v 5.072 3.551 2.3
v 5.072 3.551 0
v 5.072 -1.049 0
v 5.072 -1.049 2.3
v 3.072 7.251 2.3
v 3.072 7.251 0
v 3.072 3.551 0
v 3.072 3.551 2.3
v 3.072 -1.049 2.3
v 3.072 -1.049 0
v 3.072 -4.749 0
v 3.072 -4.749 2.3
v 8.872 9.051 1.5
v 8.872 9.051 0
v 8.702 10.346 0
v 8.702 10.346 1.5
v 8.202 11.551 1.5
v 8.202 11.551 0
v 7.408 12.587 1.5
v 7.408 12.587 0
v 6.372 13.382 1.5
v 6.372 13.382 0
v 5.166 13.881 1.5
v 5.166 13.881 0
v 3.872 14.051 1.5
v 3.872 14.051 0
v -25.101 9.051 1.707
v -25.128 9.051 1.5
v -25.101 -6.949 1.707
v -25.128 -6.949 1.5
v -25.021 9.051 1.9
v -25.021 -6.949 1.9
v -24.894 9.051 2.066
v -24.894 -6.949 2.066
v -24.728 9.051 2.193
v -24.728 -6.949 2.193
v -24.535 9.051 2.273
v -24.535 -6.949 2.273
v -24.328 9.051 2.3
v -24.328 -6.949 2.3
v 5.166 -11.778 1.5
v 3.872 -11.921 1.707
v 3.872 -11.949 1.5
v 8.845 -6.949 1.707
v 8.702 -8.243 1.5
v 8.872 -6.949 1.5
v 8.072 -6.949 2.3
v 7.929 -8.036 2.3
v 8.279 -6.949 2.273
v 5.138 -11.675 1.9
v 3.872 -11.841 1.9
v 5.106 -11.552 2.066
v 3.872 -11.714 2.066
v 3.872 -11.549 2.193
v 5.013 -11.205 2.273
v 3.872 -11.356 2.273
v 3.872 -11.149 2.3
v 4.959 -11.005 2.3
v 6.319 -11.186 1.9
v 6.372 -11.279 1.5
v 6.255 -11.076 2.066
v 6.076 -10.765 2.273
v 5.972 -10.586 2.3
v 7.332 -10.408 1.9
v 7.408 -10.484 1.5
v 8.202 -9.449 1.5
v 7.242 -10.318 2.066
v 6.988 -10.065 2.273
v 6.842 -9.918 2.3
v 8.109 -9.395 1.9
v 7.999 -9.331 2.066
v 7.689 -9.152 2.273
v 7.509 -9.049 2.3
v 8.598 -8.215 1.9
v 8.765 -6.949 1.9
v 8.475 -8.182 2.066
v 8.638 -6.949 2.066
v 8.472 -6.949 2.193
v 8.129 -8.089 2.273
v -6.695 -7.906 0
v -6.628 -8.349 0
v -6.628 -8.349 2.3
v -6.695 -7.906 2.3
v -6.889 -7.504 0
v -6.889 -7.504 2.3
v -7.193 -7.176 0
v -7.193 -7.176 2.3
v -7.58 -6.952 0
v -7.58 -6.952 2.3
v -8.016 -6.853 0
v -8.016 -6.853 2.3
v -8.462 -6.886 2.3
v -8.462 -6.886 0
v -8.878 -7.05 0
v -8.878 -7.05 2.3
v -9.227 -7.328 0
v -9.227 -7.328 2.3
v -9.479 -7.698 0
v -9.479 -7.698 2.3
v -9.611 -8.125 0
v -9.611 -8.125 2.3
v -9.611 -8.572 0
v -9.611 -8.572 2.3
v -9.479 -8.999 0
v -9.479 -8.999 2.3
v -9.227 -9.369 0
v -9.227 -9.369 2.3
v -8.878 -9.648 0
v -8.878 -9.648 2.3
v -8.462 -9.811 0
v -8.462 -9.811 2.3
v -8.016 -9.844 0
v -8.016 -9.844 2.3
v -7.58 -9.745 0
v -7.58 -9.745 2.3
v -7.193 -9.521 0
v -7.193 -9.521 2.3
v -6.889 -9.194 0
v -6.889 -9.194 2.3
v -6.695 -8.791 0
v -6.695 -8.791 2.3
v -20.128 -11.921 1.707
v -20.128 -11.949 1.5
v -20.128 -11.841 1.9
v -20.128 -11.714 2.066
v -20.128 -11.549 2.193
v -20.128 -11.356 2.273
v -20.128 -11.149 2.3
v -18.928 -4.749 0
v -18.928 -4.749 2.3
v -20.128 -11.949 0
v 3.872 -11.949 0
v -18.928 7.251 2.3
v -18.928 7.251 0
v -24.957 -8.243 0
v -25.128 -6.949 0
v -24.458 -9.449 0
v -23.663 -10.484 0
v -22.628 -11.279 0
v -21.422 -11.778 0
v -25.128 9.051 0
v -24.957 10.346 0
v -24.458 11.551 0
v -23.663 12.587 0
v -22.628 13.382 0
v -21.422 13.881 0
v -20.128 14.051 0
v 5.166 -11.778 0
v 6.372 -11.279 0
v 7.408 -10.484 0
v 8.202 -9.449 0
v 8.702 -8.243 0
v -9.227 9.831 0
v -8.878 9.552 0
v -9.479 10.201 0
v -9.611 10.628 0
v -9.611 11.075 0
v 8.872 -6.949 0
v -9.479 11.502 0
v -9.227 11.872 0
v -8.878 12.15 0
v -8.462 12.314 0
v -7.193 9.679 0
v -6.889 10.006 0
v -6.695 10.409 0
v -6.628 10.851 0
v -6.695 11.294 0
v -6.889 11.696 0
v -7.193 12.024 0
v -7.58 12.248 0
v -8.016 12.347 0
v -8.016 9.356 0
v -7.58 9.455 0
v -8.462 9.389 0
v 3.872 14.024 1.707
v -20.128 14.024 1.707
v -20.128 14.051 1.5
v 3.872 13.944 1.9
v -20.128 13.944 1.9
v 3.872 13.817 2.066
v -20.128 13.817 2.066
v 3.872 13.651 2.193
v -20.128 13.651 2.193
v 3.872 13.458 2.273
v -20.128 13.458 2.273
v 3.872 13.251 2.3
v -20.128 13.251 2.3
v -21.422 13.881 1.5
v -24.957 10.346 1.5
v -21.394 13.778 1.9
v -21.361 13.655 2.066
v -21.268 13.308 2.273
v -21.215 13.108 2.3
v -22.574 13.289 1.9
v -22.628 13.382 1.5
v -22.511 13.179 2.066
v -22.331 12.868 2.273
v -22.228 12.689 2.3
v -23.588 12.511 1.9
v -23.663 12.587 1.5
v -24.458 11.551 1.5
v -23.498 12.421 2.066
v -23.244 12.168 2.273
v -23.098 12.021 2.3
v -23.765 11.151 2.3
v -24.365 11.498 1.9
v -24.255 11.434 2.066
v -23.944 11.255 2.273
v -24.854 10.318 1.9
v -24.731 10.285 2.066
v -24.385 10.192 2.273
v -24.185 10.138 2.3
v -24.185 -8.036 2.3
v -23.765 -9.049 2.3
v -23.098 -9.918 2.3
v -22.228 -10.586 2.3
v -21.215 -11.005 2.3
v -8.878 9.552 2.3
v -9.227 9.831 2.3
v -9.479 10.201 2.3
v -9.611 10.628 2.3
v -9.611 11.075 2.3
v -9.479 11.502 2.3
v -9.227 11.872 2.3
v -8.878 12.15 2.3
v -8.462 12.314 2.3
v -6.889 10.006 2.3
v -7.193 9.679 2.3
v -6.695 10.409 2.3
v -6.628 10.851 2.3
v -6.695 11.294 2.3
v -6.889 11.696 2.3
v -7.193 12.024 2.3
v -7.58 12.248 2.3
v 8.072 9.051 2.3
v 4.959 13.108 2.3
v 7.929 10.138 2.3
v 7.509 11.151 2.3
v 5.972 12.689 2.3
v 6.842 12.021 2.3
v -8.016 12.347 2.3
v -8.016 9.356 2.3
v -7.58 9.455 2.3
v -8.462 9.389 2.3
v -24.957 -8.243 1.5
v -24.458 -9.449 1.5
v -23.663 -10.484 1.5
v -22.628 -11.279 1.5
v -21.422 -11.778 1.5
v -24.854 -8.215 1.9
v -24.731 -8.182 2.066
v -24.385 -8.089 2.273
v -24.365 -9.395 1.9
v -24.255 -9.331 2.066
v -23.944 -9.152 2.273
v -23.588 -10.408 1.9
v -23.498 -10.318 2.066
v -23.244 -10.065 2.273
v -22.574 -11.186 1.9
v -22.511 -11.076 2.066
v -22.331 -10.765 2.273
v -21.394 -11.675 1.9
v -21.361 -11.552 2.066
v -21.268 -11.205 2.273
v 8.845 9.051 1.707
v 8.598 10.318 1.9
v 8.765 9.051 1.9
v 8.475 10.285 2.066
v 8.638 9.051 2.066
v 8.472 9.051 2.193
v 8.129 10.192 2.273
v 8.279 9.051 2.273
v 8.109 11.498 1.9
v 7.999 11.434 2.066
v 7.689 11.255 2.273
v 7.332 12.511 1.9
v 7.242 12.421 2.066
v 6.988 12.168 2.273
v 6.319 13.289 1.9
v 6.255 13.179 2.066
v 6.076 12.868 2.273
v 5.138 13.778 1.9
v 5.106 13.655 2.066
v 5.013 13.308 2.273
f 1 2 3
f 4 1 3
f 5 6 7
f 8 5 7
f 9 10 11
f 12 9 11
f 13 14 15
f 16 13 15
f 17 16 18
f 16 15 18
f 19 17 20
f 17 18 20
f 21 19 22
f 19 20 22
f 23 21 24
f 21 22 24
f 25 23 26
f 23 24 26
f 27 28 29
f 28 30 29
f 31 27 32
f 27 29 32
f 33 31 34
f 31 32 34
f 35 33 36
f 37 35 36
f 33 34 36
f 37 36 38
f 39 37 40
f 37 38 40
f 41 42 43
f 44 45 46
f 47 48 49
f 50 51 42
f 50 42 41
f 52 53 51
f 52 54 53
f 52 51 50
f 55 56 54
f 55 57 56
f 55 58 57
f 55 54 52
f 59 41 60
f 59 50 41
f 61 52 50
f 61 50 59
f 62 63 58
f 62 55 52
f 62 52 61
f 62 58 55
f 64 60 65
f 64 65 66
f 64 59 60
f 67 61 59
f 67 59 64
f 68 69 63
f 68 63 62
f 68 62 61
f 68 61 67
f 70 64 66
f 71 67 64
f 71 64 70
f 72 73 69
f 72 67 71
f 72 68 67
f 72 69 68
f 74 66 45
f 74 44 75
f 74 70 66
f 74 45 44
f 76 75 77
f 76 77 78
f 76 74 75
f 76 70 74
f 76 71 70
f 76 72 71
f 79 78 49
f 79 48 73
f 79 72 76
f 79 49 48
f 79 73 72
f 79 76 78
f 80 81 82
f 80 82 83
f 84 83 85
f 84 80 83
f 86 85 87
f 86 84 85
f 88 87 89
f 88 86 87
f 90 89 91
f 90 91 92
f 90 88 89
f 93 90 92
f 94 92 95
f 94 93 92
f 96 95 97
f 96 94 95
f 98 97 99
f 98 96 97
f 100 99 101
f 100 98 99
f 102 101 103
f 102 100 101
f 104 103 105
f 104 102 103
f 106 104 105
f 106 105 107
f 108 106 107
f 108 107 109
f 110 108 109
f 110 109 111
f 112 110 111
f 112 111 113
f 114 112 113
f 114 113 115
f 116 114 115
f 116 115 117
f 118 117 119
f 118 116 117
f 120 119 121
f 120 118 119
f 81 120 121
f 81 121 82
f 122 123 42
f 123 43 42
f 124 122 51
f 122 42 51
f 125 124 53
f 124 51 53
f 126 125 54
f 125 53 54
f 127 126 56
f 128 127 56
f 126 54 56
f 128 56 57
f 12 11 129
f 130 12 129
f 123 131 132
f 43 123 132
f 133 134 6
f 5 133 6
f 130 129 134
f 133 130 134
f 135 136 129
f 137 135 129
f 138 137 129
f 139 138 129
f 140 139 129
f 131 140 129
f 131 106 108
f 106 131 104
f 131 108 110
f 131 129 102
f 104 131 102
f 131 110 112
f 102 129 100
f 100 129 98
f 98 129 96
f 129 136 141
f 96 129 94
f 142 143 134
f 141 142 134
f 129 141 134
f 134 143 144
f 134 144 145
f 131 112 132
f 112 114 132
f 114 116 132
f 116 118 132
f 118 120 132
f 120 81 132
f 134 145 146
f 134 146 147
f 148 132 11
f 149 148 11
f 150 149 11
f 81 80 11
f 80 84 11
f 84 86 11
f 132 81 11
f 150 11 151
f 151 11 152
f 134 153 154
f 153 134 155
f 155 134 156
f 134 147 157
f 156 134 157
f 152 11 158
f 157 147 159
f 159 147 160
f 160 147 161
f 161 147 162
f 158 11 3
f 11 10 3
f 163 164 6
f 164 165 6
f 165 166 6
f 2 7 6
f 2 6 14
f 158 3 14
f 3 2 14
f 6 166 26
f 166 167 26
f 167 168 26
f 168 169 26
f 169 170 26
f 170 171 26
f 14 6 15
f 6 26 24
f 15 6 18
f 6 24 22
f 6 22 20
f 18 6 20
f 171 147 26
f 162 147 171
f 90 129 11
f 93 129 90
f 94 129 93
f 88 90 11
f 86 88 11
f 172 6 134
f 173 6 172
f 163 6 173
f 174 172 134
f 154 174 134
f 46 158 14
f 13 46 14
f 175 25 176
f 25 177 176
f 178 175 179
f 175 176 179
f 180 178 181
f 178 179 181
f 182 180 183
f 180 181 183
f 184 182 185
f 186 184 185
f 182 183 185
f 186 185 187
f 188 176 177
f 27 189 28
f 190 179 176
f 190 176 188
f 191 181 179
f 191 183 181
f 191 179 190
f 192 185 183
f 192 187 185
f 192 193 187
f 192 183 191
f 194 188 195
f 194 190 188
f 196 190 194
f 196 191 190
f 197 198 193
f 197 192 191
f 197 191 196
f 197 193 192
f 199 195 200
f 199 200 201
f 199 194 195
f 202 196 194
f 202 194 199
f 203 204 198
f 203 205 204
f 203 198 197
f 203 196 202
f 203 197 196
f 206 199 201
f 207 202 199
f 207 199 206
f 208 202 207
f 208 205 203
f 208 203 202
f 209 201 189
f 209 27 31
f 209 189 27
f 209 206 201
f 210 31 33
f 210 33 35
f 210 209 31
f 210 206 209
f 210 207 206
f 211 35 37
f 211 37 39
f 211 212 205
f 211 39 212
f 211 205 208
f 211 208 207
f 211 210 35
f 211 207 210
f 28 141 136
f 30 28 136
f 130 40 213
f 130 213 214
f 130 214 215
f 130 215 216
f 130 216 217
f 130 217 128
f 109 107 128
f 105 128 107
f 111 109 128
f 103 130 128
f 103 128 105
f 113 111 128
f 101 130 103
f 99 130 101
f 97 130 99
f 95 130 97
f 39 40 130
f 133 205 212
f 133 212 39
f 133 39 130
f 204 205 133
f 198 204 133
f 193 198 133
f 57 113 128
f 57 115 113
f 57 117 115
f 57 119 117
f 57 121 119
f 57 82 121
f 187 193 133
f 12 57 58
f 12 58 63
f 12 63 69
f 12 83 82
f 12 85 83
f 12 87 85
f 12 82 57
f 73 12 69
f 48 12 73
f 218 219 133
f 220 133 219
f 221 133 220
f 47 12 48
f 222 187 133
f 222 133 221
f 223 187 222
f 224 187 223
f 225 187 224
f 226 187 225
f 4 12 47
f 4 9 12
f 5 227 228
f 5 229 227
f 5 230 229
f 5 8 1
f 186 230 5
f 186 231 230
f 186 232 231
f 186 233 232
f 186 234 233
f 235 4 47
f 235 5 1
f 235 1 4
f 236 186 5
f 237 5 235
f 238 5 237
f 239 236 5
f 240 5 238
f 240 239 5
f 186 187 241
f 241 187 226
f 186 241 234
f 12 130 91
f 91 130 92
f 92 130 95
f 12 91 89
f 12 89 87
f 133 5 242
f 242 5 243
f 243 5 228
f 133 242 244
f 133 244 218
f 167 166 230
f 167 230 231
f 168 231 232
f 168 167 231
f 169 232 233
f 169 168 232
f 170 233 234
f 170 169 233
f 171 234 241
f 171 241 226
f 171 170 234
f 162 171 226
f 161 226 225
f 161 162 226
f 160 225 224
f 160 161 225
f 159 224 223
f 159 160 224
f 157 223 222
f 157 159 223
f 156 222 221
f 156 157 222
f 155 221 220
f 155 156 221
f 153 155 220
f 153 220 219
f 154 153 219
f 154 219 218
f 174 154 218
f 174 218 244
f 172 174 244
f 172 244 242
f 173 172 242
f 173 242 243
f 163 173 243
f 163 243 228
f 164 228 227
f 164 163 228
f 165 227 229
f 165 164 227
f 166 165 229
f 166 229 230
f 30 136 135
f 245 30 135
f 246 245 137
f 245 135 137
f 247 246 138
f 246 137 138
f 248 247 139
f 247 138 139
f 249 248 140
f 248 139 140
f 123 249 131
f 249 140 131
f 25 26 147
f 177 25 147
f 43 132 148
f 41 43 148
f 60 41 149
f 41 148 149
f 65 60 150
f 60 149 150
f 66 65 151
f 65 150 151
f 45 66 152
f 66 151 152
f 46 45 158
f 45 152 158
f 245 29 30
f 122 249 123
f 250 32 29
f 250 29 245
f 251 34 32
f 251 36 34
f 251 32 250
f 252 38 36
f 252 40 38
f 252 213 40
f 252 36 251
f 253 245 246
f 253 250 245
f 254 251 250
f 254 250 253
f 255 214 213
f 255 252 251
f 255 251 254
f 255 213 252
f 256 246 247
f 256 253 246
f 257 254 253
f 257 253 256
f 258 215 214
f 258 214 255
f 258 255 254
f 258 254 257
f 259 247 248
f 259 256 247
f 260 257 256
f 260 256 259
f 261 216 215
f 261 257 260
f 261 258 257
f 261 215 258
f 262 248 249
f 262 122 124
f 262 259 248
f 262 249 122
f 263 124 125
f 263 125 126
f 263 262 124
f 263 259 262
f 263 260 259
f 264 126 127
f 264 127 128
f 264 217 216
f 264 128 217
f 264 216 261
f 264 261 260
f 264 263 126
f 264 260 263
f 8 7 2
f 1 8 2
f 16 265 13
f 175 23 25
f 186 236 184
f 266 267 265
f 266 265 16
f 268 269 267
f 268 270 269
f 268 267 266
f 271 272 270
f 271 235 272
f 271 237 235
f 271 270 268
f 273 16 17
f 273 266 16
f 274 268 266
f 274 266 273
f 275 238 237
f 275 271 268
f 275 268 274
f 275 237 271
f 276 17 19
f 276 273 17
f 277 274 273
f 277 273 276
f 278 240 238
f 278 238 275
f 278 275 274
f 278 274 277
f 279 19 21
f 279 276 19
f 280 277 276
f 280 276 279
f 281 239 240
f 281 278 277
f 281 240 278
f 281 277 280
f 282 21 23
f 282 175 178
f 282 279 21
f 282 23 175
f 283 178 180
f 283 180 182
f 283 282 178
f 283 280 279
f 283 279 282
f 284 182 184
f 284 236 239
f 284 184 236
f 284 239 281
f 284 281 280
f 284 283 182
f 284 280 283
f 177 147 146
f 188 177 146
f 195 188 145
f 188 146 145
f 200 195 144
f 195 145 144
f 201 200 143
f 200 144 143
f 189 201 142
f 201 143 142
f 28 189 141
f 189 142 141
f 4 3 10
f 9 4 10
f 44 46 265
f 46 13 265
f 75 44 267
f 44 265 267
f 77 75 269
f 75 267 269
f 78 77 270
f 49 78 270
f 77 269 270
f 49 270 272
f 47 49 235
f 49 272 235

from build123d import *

# Parameters (mm, degrees)
F0_R     = 1.5
F1_DEPTH = 2.3
F2_R     = 0.8


with BuildPart() as f1:
    # F0 (on Top) → F1 (new body)
    with BuildSketch(Plane.XY):
        with BuildLine():
            Line((3.872134, 14.051424), (-20.127866, 14.051424))
            ThreePointArc((-20.127866, 14.051424), (-23.6634, 12.586958), (-25.127866, 9.051424))
            Line((-25.127866, 9.051424), (-25.127866, -6.948576))
            ThreePointArc((-25.127866, -6.948576), (-23.6634, -10.48411), (-20.127866, -11.948576))
            Line((-20.127866, -11.948576), (3.872134, -11.948576))
            ThreePointArc((3.872134, -11.948576), (7.407668, -10.48411), (8.872134, -6.948576))
            Line((8.872134, -6.948576), (8.872134, 9.051424))
            ThreePointArc((8.872134, 9.051424), (7.407668, 12.586958), (3.872134, 14.051424))
        make_face()
        with Locations((-8.127866, -8.348576)):
            Circle(F0_R, mode=Mode.SUBTRACT)
        with Locations((-8.127866, 10.851424)):
            Circle(F0_R, mode=Mode.SUBTRACT)
        Polygon((3.072134, -4.748576), (-18.927866, -4.748576), (-18.927866, 7.251424), (3.072134, 7.251424), (3.072134, 3.551424), (5.072134, 3.551424), (5.072134, 1.251424), (5.072134, -1.048576), (3.072134, -1.048576), align=None, mode=Mode.SUBTRACT)
    extrude(amount=F1_DEPTH)

    # F2
    f2_edges = [f1.edges().sort_by_distance(p)[0] for p in [
        (-23.6634, -10.48411, 2.3),
    ]]
    fillet(f2_edges, radius=F2_R)


solid = f1.part
